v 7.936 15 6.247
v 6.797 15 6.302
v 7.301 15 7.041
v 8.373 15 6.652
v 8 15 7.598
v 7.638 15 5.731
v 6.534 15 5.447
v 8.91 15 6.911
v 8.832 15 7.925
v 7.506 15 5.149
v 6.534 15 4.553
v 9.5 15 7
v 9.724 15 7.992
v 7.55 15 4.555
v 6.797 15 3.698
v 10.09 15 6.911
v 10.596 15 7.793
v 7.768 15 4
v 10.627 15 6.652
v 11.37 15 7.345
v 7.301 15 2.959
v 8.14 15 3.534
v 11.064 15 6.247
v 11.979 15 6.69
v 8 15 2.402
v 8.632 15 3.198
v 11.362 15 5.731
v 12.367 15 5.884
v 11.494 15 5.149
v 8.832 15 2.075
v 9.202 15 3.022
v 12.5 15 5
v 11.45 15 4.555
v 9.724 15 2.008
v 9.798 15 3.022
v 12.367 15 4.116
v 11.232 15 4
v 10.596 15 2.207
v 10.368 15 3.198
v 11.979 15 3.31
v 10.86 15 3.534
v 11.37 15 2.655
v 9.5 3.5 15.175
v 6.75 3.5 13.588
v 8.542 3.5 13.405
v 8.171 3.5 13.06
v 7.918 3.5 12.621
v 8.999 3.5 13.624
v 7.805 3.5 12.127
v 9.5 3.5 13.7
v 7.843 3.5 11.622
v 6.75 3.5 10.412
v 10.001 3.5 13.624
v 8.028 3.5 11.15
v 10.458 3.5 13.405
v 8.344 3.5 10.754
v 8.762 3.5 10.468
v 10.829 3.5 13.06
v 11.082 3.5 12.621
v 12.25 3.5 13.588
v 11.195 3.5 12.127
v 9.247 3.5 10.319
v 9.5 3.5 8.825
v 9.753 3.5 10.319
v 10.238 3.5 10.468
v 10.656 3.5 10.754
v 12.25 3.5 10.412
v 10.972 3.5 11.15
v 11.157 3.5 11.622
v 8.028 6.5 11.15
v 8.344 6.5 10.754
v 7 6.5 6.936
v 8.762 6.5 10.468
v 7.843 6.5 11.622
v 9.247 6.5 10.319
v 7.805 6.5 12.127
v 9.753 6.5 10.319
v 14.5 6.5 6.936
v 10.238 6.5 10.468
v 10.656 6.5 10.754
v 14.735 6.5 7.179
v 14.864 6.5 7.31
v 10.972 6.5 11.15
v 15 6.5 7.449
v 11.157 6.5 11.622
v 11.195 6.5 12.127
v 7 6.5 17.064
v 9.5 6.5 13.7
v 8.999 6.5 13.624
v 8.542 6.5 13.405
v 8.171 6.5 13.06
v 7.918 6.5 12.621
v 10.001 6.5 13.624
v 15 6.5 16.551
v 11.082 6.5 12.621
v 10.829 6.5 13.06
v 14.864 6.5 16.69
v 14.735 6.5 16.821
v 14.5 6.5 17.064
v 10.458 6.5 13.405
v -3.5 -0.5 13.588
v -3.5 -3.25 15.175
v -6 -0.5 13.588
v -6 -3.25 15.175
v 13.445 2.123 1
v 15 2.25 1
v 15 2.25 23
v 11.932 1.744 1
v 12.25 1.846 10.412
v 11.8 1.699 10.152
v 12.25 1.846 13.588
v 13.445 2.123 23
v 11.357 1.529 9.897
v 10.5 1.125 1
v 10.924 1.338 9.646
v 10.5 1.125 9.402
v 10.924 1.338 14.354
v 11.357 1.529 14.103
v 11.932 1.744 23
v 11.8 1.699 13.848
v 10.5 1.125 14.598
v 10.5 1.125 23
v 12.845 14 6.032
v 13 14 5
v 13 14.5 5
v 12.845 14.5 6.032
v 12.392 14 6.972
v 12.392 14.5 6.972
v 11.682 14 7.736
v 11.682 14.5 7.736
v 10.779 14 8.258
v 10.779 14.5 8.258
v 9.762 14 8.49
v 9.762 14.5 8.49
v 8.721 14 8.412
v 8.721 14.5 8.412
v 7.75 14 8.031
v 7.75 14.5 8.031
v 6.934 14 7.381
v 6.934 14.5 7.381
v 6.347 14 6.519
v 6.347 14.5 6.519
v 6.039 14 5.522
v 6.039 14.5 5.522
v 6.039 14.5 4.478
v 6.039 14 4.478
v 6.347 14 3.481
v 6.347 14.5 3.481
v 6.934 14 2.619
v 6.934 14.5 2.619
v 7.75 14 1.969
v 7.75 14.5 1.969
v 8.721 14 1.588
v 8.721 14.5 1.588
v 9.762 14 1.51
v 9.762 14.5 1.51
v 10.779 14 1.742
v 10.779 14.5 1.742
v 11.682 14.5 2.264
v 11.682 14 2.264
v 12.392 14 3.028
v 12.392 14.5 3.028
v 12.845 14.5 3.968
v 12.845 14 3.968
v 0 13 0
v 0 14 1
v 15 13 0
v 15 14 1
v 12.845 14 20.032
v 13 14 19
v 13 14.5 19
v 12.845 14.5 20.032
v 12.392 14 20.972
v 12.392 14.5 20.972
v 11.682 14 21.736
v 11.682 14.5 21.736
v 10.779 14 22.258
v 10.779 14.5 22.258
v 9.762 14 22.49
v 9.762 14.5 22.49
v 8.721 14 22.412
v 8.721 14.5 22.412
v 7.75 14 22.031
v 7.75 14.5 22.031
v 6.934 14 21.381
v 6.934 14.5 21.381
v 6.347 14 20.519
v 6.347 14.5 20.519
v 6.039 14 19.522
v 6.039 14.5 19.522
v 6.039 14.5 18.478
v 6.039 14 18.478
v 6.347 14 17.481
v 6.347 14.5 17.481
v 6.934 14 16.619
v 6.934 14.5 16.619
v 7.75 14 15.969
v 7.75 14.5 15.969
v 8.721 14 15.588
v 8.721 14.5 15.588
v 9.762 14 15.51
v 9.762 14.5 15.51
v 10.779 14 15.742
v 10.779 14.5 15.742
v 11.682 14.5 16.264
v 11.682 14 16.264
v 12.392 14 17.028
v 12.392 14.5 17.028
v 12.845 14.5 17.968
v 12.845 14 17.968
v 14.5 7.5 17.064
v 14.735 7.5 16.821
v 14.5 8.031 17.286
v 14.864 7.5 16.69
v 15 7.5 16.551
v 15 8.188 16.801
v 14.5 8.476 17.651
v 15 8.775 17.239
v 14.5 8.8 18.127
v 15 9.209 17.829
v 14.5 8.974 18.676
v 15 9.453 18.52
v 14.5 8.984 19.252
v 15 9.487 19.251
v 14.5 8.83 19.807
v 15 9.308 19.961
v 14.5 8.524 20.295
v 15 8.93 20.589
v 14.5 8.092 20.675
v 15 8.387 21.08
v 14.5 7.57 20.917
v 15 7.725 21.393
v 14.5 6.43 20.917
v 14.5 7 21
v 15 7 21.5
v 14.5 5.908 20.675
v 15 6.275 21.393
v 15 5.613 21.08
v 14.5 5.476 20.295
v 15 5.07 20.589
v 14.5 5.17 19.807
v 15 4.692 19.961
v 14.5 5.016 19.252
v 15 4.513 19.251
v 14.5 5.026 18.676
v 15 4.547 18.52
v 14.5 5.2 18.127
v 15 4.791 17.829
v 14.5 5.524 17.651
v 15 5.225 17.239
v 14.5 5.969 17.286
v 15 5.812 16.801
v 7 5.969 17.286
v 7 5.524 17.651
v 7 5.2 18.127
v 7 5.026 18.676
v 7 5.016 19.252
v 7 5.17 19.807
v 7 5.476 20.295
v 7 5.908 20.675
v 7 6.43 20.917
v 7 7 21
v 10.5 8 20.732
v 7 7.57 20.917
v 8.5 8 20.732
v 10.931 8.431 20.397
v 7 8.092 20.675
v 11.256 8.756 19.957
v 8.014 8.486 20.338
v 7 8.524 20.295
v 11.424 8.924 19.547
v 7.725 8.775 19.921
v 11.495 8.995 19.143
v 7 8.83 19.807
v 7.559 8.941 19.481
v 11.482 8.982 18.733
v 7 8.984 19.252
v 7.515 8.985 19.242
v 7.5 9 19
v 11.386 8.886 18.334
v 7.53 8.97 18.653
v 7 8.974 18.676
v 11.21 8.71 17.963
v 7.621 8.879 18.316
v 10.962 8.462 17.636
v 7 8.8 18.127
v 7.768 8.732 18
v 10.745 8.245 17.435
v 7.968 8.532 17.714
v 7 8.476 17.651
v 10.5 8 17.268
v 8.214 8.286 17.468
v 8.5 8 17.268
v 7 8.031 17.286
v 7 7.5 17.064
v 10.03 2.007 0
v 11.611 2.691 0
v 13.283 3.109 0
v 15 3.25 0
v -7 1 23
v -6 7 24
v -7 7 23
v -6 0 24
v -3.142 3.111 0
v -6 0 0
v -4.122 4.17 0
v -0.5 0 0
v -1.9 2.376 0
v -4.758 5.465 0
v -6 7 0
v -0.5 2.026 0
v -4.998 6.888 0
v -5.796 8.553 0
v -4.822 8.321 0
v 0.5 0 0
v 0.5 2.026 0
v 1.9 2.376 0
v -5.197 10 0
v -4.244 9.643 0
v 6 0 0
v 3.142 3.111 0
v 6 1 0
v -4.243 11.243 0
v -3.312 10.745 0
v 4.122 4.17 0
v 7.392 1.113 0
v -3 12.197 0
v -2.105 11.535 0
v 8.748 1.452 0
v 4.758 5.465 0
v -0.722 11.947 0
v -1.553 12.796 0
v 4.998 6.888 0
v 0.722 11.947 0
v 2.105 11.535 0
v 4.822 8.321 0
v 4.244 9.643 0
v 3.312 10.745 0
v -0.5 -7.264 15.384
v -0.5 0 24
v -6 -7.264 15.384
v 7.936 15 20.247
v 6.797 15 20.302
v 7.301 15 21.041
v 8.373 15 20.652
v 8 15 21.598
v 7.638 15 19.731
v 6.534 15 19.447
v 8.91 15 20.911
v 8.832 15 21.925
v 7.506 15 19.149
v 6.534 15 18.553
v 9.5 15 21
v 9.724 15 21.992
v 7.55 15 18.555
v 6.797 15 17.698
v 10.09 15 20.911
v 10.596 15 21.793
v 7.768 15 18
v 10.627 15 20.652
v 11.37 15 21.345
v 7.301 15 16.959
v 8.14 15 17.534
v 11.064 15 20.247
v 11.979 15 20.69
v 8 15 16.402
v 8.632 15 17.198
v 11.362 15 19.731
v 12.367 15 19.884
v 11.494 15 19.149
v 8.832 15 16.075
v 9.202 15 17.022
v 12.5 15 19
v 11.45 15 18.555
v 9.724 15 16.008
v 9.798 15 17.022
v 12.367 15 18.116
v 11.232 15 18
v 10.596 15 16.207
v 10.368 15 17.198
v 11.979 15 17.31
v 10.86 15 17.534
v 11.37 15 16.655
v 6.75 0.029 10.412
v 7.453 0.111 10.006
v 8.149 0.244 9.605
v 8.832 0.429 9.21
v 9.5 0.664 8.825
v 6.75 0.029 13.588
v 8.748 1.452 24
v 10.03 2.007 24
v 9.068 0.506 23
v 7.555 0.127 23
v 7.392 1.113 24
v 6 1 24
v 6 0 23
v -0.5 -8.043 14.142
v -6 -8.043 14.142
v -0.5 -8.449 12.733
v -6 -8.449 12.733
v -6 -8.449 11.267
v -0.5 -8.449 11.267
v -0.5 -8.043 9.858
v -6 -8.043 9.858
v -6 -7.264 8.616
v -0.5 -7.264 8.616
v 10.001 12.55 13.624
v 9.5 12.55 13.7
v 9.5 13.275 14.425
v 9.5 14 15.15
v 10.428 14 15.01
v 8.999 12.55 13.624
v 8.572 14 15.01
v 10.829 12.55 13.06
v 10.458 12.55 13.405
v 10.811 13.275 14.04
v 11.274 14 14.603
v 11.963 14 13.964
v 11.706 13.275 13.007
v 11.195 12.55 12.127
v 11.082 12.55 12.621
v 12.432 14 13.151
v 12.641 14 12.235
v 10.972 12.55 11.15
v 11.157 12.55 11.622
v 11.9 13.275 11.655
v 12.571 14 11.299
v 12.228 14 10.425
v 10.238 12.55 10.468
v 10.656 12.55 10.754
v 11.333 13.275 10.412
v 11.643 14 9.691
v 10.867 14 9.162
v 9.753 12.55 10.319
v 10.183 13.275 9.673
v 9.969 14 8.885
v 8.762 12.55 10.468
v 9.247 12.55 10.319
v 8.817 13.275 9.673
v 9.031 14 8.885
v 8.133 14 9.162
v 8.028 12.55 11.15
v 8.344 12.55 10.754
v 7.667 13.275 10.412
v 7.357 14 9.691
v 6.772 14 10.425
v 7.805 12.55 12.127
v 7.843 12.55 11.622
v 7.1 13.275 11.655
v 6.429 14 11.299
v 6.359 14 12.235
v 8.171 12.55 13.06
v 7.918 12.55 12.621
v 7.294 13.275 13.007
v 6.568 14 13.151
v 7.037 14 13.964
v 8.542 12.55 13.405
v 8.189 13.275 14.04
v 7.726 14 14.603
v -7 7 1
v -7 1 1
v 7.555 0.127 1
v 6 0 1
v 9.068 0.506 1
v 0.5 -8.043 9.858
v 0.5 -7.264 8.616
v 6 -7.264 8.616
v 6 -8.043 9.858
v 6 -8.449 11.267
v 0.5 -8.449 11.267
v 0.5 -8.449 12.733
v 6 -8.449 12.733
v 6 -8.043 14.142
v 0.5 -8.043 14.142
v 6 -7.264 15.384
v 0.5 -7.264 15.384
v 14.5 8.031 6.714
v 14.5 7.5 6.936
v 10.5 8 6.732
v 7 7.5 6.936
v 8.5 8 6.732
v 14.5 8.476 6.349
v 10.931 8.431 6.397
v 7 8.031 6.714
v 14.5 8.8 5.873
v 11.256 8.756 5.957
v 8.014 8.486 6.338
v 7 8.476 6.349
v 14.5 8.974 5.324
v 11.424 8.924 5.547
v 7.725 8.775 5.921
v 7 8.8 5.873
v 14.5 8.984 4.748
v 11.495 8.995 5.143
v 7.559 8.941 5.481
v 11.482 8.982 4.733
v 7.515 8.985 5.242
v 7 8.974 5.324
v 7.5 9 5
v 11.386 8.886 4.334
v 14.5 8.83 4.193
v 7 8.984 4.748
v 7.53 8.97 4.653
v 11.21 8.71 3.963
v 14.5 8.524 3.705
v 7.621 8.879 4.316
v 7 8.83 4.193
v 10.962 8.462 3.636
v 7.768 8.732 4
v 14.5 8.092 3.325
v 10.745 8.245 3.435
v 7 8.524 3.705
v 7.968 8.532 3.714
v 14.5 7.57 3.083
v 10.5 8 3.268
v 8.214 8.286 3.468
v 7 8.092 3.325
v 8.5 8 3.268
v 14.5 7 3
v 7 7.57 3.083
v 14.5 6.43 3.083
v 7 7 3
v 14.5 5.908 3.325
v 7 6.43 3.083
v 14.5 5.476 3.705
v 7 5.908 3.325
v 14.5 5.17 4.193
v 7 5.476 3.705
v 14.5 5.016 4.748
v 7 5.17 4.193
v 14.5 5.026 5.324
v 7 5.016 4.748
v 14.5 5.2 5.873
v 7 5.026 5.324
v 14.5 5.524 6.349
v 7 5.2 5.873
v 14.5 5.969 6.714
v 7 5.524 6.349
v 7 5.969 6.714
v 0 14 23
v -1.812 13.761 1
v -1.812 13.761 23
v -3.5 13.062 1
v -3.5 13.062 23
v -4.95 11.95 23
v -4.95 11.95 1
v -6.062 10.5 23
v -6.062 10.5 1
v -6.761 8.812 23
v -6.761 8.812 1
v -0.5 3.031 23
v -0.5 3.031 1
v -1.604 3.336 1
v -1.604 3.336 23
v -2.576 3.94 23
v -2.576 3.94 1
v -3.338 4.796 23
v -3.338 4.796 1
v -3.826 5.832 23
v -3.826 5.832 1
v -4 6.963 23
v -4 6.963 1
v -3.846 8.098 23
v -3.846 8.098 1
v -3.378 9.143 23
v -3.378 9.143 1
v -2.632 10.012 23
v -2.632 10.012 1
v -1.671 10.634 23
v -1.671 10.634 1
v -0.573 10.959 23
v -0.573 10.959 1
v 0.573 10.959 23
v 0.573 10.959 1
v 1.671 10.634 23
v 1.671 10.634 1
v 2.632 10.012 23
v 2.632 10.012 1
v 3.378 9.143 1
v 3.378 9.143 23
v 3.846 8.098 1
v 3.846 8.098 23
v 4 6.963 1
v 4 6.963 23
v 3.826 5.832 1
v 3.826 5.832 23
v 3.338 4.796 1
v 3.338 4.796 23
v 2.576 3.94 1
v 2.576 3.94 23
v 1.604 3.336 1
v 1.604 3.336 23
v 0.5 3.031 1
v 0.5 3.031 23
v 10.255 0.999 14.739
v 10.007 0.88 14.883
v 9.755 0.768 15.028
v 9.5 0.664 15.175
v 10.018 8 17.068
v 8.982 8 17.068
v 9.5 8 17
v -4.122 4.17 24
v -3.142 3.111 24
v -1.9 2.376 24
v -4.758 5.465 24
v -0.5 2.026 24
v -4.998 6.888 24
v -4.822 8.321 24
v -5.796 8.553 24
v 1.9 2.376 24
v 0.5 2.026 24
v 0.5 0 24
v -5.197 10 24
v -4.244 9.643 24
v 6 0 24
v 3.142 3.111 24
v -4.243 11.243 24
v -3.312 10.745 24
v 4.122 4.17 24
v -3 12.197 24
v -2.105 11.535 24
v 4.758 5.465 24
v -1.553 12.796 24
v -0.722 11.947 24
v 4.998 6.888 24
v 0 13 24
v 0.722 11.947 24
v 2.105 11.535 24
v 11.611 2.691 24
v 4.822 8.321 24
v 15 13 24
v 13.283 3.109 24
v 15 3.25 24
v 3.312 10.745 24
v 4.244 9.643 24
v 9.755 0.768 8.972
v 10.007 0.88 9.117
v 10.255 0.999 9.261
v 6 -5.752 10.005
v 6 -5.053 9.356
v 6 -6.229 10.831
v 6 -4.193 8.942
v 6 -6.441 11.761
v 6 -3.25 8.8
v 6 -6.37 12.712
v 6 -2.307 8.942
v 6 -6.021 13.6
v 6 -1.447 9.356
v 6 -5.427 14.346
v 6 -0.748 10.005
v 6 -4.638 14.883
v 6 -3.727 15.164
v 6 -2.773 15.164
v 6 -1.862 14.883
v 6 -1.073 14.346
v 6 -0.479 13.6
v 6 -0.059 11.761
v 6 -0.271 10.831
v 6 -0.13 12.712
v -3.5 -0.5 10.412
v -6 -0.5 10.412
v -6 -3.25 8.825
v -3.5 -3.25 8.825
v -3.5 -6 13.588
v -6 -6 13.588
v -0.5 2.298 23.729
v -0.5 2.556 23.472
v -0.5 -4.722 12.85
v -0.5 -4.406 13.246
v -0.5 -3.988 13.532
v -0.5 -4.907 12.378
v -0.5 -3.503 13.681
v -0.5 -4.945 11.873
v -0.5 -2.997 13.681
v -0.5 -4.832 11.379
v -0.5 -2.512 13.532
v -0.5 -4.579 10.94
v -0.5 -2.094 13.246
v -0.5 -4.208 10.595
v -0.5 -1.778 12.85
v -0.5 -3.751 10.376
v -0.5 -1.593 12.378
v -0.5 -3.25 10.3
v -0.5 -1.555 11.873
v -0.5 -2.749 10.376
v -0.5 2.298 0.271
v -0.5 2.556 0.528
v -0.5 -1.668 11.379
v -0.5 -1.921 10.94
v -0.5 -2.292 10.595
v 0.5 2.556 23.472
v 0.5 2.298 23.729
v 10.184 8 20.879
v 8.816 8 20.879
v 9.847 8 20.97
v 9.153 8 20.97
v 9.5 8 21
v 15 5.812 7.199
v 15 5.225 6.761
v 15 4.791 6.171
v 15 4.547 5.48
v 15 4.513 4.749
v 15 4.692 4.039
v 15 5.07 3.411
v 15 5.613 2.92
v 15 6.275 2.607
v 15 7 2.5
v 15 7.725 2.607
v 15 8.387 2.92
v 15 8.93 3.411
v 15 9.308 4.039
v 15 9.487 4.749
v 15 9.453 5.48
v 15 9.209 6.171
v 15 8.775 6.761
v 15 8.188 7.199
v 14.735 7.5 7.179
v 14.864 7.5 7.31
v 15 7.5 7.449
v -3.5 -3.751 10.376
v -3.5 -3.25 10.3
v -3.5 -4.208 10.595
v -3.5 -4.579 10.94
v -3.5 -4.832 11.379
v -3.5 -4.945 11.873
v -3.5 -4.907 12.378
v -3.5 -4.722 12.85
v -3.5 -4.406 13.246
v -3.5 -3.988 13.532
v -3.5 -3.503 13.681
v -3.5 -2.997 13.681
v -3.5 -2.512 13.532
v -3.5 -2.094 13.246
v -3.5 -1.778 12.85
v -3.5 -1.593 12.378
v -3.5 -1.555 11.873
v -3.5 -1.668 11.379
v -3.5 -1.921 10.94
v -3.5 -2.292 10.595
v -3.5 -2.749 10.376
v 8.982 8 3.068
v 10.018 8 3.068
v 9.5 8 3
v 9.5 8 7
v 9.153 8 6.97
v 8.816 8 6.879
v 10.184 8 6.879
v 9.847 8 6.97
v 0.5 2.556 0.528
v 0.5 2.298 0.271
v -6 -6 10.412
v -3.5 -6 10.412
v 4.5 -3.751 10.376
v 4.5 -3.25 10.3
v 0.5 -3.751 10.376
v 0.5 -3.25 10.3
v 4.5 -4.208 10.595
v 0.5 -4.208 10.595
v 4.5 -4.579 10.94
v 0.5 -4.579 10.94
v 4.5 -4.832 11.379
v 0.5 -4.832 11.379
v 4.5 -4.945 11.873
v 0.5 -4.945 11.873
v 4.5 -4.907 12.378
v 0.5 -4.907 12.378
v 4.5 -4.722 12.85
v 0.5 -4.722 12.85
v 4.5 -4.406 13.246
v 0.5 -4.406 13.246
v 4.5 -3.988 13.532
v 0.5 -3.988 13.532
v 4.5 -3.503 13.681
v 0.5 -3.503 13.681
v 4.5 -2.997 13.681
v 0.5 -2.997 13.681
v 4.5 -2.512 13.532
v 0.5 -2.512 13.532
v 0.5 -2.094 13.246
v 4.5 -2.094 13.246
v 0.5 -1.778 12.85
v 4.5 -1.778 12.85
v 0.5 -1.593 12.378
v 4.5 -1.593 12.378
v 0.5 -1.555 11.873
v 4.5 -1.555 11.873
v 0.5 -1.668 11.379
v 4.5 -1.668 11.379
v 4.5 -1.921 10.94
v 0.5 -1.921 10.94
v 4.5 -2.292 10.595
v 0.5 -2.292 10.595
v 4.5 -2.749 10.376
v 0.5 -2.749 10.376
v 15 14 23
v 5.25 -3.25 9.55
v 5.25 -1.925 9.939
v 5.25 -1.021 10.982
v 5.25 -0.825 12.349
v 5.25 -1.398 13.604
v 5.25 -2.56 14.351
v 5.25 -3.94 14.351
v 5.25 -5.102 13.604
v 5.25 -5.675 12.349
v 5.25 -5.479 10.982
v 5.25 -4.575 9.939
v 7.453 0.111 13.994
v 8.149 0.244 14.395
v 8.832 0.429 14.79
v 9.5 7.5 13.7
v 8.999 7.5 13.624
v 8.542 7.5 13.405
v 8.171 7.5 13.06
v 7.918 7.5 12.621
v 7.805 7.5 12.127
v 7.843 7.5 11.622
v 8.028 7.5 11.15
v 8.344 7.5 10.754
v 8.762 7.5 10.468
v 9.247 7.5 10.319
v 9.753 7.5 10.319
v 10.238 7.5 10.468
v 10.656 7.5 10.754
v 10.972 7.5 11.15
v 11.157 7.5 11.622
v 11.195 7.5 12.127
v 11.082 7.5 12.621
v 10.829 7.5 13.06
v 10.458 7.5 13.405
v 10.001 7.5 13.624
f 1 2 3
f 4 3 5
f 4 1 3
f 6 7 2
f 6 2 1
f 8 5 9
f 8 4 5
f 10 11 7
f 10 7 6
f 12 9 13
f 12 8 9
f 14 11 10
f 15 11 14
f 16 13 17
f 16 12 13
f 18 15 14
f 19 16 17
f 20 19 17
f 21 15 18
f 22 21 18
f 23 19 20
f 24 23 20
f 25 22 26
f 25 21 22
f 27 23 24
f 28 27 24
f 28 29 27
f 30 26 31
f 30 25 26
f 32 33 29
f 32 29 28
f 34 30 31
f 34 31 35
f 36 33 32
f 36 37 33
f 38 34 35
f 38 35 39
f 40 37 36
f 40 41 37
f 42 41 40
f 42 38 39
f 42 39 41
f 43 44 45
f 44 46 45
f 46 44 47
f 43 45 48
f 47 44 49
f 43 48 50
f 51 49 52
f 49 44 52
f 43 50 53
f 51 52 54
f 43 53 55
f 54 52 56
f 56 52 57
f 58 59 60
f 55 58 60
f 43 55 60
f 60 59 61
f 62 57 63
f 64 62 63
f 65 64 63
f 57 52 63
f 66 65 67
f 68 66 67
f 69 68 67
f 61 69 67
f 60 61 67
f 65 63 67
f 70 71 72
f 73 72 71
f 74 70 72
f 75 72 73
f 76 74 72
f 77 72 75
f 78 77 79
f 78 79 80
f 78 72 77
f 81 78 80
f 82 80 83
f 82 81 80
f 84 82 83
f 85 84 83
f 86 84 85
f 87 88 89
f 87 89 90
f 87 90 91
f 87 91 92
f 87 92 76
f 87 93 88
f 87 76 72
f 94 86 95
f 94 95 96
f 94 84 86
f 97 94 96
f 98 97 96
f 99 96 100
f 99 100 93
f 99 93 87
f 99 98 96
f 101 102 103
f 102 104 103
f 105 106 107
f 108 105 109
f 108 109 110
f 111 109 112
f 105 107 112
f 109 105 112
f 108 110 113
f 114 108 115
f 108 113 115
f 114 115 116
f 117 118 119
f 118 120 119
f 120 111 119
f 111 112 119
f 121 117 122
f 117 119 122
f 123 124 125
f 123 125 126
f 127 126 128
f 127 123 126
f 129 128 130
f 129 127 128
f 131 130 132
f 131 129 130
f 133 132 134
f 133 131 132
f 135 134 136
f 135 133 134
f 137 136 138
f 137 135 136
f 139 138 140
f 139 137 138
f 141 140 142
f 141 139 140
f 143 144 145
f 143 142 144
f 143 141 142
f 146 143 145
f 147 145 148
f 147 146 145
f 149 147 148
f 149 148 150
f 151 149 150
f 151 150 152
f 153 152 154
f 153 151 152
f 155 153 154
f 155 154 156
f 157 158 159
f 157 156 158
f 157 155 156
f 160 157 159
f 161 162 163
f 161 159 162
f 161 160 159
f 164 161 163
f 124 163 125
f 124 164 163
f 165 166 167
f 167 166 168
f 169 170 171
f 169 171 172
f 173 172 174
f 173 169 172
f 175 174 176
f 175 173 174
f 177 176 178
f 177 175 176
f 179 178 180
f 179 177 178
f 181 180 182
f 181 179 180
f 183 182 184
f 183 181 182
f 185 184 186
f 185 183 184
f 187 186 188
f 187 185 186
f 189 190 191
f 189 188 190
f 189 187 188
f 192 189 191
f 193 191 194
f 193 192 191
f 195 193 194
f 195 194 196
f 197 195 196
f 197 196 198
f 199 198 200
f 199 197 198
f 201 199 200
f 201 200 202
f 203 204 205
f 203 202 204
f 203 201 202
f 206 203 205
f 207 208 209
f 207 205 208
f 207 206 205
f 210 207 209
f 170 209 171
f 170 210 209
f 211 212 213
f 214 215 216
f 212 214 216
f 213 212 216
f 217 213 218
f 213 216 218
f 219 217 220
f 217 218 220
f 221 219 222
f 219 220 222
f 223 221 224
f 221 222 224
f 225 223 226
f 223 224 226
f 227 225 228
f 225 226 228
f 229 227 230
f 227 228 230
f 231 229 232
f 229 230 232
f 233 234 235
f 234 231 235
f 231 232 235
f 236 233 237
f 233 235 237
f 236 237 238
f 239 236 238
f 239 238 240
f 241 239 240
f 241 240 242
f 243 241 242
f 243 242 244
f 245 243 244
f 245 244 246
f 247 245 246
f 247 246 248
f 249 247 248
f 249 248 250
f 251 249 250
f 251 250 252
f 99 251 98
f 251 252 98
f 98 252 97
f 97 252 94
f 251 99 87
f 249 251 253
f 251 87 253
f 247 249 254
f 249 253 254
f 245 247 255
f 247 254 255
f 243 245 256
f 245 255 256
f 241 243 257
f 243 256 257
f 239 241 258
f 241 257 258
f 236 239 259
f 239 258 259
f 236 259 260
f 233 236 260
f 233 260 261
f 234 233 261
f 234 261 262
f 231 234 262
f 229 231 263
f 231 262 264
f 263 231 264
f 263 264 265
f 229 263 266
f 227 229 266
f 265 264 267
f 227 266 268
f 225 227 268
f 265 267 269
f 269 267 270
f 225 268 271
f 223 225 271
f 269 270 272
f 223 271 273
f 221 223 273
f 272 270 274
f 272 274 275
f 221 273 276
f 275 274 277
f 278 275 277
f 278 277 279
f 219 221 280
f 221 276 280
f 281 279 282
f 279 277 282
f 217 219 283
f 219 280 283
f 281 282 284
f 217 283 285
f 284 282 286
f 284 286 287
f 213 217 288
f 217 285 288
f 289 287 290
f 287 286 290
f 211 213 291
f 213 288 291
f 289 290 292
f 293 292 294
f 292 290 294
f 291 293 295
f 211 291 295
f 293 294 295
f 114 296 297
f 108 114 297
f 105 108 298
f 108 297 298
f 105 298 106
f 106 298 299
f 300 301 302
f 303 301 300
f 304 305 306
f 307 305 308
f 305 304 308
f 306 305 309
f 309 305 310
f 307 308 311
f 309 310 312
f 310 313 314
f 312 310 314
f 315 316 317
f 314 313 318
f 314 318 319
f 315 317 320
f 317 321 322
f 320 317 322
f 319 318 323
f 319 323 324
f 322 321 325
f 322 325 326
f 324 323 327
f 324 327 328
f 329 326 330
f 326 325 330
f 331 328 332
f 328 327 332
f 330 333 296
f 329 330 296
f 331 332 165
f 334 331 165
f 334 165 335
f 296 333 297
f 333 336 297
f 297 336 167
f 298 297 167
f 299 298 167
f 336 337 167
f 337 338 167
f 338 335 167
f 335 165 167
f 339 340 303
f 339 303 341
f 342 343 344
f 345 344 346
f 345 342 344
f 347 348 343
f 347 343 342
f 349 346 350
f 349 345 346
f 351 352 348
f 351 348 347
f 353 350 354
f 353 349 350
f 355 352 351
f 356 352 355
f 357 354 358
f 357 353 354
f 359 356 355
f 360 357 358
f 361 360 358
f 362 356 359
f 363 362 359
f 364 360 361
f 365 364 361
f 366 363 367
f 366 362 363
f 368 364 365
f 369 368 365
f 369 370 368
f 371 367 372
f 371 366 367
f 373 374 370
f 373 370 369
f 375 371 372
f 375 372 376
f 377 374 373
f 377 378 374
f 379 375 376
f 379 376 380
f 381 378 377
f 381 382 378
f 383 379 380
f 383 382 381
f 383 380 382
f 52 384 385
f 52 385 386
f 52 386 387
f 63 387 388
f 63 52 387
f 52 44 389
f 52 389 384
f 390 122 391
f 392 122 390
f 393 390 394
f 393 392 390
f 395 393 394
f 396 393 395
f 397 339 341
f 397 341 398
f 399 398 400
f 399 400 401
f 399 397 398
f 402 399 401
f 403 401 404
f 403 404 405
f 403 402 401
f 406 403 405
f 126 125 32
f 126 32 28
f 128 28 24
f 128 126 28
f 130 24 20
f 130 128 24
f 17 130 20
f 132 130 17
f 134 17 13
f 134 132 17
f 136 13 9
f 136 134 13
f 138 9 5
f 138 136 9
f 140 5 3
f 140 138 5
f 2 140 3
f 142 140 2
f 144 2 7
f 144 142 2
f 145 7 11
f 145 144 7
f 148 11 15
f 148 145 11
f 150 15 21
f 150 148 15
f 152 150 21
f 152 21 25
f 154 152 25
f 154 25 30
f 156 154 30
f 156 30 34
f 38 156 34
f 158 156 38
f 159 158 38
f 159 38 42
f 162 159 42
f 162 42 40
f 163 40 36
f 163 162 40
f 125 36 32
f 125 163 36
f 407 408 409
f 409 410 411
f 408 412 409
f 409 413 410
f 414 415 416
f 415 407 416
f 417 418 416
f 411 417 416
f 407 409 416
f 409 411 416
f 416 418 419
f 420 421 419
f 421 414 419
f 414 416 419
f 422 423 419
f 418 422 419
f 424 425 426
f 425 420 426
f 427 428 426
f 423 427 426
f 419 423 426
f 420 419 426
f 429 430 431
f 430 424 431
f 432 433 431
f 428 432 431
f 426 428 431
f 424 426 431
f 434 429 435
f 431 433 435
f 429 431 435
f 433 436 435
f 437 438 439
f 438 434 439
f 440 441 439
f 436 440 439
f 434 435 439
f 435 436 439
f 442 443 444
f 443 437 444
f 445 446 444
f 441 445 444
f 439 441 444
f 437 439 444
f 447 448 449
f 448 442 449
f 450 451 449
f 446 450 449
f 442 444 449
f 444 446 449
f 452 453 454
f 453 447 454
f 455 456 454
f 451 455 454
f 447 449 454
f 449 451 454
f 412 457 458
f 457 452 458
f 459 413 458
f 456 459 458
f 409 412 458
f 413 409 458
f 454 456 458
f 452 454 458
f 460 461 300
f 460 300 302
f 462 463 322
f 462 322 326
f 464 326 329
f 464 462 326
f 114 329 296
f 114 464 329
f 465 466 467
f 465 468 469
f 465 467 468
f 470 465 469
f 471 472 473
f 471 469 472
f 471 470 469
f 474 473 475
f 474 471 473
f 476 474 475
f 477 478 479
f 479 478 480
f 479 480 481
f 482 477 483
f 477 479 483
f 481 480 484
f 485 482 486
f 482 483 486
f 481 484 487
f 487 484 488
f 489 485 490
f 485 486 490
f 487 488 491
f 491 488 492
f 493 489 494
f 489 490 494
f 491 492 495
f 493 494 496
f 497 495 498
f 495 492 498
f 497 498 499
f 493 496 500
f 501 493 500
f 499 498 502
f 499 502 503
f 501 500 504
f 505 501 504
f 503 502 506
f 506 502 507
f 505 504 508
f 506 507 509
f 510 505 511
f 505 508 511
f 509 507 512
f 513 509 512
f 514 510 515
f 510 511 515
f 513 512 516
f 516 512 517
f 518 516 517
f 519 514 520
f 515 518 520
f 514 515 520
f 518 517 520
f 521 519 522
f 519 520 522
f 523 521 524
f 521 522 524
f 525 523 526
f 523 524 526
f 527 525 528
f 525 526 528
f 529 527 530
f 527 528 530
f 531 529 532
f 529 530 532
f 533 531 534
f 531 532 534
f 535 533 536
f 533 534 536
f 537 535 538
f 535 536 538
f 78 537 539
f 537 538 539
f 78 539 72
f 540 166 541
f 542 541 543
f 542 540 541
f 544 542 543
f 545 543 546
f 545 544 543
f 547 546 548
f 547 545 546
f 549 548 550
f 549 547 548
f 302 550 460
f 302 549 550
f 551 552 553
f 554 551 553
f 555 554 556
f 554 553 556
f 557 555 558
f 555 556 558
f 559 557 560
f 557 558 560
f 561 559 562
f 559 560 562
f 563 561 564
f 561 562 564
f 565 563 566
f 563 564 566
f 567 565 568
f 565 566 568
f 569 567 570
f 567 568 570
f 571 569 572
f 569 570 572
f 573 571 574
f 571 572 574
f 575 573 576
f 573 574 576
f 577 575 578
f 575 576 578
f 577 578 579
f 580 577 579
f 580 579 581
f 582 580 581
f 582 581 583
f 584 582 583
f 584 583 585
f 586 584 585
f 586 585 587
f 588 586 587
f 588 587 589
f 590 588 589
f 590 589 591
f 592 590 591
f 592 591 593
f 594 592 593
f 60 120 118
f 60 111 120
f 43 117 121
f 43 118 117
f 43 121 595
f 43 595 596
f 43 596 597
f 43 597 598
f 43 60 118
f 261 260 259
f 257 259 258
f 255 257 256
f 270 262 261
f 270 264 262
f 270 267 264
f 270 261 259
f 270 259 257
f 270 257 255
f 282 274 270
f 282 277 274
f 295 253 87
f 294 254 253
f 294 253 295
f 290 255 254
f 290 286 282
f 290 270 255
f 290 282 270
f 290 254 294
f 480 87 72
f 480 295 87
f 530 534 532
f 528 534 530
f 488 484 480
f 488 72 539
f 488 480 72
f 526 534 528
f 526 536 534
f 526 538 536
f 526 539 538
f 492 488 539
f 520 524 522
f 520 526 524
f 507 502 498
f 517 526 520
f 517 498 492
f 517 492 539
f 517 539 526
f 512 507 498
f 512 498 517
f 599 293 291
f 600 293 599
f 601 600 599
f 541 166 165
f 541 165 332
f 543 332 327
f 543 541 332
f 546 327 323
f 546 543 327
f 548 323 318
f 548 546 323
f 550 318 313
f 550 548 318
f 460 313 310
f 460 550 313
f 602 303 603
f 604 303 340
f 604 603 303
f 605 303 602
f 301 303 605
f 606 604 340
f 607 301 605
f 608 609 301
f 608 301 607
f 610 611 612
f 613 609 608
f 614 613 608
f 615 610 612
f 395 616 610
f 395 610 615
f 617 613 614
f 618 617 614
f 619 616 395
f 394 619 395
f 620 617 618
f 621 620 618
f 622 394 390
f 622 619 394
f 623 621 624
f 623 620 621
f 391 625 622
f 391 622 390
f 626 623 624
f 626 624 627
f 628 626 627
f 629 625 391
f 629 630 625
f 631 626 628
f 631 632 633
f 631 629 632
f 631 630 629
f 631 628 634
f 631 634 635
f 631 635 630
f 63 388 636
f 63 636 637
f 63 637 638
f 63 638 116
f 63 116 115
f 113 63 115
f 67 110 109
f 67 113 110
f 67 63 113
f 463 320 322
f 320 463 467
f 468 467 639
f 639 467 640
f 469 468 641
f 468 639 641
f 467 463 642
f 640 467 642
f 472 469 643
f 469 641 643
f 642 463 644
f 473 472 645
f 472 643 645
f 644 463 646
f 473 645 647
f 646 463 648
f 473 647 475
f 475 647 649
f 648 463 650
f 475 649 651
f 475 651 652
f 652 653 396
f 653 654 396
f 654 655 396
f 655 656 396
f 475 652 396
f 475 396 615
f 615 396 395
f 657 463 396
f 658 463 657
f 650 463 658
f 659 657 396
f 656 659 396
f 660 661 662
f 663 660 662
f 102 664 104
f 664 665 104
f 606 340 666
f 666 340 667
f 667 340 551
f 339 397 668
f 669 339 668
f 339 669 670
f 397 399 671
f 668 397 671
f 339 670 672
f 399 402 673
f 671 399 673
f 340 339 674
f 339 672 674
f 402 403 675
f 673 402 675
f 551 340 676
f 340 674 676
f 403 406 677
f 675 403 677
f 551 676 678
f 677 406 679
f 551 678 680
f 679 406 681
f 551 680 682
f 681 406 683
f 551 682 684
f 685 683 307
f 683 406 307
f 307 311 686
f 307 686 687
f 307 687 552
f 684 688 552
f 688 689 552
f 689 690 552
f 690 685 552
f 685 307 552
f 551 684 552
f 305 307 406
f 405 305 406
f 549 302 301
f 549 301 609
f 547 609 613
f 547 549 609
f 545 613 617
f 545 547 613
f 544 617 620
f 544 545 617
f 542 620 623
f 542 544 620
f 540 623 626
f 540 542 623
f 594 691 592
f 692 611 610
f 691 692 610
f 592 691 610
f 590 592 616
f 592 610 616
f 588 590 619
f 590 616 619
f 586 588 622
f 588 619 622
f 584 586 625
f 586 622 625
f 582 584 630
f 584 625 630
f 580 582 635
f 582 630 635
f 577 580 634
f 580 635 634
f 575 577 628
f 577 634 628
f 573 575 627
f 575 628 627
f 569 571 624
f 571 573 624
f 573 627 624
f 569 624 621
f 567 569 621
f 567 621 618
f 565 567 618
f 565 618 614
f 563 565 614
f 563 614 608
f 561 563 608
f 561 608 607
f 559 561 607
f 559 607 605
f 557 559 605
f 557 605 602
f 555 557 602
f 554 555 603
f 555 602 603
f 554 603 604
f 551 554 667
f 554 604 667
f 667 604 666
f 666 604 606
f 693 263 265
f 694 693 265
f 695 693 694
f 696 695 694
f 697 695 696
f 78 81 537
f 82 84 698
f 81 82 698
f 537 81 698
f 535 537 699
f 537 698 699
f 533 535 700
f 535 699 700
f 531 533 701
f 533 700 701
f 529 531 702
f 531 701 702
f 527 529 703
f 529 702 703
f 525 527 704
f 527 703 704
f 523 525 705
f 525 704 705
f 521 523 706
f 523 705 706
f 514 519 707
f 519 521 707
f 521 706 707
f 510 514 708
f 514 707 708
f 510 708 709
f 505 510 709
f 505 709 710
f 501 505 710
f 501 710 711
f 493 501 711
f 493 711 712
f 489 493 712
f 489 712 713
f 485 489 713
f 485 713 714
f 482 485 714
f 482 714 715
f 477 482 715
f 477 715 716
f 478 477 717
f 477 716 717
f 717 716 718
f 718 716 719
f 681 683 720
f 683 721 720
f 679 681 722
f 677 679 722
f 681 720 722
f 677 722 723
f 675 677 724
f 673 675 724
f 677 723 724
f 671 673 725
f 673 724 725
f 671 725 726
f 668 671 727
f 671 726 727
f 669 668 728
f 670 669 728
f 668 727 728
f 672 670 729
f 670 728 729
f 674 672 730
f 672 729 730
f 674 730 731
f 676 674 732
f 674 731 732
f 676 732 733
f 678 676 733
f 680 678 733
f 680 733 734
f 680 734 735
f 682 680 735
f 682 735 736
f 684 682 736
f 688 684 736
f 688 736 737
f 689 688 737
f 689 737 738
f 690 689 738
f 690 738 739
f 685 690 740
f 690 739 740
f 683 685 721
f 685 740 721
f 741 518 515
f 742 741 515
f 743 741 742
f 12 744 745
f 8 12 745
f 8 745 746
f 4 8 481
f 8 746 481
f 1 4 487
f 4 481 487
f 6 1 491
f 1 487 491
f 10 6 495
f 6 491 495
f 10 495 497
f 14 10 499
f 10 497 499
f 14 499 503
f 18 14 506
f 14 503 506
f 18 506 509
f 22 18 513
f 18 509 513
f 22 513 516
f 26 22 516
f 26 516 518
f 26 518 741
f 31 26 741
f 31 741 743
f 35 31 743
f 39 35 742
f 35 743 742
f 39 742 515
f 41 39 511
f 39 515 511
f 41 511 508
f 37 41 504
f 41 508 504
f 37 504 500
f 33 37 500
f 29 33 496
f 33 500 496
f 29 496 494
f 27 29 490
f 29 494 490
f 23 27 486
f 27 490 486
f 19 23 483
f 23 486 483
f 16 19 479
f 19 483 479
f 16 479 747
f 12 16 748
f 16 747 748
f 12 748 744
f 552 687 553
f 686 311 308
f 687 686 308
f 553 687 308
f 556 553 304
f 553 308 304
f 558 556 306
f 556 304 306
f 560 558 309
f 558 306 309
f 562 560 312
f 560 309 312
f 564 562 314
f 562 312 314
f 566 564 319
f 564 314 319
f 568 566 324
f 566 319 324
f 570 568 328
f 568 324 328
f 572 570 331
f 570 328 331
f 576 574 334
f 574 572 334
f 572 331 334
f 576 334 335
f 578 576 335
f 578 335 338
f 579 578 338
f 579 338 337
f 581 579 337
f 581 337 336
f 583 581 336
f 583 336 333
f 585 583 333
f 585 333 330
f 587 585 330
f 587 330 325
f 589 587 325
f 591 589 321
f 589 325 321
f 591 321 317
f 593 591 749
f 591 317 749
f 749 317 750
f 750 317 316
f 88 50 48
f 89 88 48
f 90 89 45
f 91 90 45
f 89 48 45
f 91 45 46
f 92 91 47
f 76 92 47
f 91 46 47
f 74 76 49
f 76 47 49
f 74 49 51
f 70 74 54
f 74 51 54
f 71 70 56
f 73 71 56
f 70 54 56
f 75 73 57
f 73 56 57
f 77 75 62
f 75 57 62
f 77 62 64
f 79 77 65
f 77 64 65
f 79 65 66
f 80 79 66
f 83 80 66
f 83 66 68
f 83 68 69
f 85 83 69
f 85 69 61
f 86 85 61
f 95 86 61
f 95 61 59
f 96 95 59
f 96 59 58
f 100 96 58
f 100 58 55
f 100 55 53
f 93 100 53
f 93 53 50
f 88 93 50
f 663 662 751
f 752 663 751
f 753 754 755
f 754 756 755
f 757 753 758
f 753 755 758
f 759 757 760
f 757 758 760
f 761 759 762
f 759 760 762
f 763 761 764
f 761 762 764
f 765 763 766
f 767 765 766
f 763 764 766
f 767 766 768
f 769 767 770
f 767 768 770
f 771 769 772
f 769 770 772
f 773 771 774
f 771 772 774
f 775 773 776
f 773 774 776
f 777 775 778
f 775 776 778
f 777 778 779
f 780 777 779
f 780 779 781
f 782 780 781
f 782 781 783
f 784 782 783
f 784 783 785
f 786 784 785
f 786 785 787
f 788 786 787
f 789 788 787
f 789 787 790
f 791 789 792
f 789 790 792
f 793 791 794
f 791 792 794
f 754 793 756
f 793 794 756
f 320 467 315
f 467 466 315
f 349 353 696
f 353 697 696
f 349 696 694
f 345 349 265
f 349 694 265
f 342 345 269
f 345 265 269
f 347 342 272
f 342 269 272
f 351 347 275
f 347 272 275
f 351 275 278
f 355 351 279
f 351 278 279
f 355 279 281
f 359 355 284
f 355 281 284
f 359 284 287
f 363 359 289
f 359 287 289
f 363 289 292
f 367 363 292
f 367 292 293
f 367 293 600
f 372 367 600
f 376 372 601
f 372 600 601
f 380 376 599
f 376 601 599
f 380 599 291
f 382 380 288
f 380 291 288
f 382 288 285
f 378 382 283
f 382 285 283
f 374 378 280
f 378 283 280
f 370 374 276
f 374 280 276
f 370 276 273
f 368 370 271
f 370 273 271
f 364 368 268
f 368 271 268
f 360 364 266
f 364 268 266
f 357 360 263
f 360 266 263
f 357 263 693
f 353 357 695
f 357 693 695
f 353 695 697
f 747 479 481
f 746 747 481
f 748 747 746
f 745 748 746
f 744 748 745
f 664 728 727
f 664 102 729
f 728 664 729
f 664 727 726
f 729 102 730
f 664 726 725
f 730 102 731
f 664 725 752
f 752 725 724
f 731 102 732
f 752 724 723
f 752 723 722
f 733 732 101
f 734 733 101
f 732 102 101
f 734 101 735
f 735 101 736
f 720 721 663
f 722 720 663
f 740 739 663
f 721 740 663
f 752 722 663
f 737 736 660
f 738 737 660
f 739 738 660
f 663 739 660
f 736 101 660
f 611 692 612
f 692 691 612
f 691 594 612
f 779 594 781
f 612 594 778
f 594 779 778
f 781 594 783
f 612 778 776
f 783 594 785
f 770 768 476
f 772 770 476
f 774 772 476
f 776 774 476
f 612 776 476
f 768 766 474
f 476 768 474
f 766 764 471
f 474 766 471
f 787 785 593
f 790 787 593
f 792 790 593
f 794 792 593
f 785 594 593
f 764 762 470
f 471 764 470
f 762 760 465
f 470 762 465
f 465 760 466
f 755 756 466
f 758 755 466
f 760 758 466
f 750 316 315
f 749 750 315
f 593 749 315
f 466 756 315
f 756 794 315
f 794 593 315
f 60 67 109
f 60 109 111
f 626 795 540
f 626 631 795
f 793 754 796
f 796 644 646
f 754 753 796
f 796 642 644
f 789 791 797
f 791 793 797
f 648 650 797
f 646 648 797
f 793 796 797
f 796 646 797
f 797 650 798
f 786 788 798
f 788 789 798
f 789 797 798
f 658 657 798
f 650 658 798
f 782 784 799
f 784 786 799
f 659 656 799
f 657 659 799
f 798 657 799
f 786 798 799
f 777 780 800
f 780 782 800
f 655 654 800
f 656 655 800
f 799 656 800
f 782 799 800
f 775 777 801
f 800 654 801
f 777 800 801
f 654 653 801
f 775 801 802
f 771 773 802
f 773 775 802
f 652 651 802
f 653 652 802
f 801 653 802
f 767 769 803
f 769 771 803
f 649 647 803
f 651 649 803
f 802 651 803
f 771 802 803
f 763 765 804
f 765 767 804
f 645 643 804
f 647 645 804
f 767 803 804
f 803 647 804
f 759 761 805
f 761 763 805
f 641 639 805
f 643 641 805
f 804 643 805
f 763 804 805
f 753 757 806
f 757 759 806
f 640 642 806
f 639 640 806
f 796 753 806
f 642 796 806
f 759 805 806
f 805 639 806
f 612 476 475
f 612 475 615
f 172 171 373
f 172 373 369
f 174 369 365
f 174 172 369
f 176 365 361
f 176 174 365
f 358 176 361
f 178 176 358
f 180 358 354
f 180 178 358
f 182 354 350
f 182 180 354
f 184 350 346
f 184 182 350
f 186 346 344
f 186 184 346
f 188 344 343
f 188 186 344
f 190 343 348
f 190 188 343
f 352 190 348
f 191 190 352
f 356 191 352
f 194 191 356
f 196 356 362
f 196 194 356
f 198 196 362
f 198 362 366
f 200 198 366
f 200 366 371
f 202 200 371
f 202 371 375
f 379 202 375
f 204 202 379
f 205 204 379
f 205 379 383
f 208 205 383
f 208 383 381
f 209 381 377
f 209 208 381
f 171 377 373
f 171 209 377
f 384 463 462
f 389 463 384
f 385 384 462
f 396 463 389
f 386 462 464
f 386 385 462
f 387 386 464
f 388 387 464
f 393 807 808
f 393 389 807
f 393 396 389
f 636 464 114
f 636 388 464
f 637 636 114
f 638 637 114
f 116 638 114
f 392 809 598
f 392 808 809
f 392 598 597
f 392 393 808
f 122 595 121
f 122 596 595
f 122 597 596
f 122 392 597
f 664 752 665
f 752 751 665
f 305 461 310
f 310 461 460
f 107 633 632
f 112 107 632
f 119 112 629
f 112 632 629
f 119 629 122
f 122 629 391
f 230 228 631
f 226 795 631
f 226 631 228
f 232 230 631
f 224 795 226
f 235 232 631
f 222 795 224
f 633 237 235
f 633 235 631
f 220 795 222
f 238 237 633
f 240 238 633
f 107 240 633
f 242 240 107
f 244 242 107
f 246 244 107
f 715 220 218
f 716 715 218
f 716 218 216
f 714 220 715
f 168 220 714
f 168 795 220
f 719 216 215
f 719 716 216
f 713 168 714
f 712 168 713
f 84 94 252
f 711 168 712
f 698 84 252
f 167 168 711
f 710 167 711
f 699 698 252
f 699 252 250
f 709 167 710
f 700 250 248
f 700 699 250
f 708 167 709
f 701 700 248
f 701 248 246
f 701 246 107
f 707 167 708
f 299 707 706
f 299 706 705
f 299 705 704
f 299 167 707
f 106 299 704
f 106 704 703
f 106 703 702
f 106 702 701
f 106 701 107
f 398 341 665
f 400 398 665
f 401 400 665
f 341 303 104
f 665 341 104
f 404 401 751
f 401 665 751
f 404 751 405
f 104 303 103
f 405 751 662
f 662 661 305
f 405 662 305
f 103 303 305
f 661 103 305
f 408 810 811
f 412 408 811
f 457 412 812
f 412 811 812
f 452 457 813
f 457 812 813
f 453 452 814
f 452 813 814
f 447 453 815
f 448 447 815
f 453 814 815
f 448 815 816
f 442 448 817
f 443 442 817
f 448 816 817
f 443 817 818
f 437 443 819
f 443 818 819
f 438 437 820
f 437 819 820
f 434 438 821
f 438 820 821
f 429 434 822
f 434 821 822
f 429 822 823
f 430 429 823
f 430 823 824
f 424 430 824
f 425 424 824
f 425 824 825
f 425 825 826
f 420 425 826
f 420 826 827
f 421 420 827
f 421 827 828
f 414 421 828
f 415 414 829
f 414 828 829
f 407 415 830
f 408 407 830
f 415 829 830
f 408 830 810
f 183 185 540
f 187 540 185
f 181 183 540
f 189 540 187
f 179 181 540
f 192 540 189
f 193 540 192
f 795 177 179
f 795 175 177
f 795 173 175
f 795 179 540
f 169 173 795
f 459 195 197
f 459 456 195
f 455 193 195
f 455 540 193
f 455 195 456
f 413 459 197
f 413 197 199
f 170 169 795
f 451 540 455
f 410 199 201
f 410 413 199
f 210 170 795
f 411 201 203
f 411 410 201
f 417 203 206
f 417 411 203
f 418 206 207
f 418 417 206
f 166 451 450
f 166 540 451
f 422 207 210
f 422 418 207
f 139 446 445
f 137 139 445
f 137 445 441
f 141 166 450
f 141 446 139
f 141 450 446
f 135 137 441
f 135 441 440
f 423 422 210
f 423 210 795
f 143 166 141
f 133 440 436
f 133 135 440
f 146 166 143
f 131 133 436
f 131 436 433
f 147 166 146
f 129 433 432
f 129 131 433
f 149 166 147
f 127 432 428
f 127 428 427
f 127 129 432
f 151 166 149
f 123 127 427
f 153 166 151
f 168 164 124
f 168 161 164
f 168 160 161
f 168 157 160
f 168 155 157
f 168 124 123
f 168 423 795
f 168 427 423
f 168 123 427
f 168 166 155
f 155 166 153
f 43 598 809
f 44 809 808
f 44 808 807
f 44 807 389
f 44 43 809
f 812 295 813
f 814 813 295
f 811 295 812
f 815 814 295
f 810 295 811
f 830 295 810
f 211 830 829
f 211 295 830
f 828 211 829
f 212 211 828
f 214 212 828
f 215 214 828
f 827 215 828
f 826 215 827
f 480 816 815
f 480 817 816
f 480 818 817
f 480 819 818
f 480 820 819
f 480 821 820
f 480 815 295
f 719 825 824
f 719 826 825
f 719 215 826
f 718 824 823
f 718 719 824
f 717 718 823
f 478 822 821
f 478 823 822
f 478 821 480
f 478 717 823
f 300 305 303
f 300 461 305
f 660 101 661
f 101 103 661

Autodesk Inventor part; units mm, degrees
ref_plane "YZ Plane" through (0, 0, 0) normal (1, 0, 0) x (0, 1, 0)
sketch "Sketch1" plane through (0, 0, 0) normal (0, 0, 1) x (1, 0, 0)
  line L0 (0, 14) -> (0, 11)
  line L1 (0, 14) -> (15, 14)
  line L2 (15, 14) -> (15, 0)
  circle A0 centre (0, 7) radius 4
  line L3 (0, 3) -> (0, 0) construction
  line L4 (0, 0) -> (15, 0)
  line L5 (0, 11) -> (0, 3) construction
  line L6 (0.5, 0) -> (-0.5, 0)
  line L7 (-0.5, 0) -> (-0.5, 3.0314)
  line L8 (-0.5, 3.0314) -> (0.5, 3.0314)
  line L9 (0.5, 3.0314) -> (0.5, 0)
  line L10 (-0.5, 0) -> (-7, 0)
  line L11 (-7, 0) -> (-7, 14)
  line L12 (-7, 14) -> (0, 14)
  line L13 (-4, 10.1012) -> (-4, 3.4286) construction
  point P0 (0, 3.0314)
  dimension "d0" = 8
  dimension "d1" = 15
  dimension "d2" = 14
  dimension "d79" = 1
  dimension "d80" = 3
  dimension "d81" = 3
extrude "Extrusion1" add sketch "Sketch1" along normal blind 24 contours L1 L2 L4 L9 A0 L0 | L0 A0 L7 L10 L11 L12
sketch "Sketch2" plane through (15, 0, 0) normal (1, 0, 0) x (0, 0, -1)
  line L0 (-24, 0) -> (-24, 14) projected
  line L1 (0, 0) -> (0, 14) projected
  point P0 (-19, 7)
  point P1 (-5, 7)
  point P2 (-24, 7)
  dimension "d5" = 5
  dimension "d6" = 5
  dimension "d7" = 14
hole "Hole1" at (15, 7, 19) at (15, 7, 5) direction (-1, 0, 0) diameter 4 depth 8
sketch "Sketch4" plane through (0, 14, 0) normal (0, 1, 0) x (1, 0, 0)
  circle A0 centre (9.5, -5) radius 3.5
  circle A1 centre (9.5, -19) radius 3.5
  line L0 (15, -24) -> (-7, -24) projected
  line L1 (15, 0) -> (0, 0) projected
  line L2 (-0.5, 0) -> (0.5, 0) projected
  line L3 (-0.5, -24) -> (0.5, -24) projected
  line L4 (4, -24) -> (4, 0) projected
  line L5 (4, -24) -> (4, 0)
  line L6 (4, -24) -> (4, 0) projected
  line L7 (15, 0) -> (15, -24) projected
  line L8 (0.5, 0) -> (0.5, -24) projected
  line L9 (-0.5, 0) -> (-0.5, -24) projected
  point P0 (4, -24)
  point P1 (0, -24)
  dimension "d18" = 7
  dimension "d19" = 7
  dimension "d20" = 14
  dimension "d21" = 5
  dimension "d22" = 5
  dimension "d42" = 5.5
  dimension "d43" = 5.5
extrude "Extrusion2" add sketch "Sketch4" along normal blind 1 contours A0 | A1
sketch "Sketch3" plane through (2, 15, 0) normal (0, 1, 0) x (1, 0, 0)
  circle A0 centre (7.5, -5) radius 3.5 projected
  circle A1 centre (7.5, -19) radius 3.5 projected
hole "Hole2" at (9.5, 15, 19) at (9.5, 15, 5) direction (0, -1, 0) diameter 4 depth 7
sketch "Sketch5" plane through (15, 0, 0) normal (1, 0, 0) x (0, 0, -1)
  line L0 (-17.0635, 7.5) -> (-6.9365, 7.5)
  line L1 (-6.9365, 7.5) -> (-6.9365, 6.5)
  line L2 (-6.9365, 6.5) -> (-17.0635, 6.5)
  line L3 (-17.0635, 6.5) -> (-17.0635, 7.5)
  circle A0 centre (-5, 7) radius 2 projected
  circle A1 centre (-19, 7) radius 2 projected
  point P0 (0, 0)
  point P1 (-6.9365, 7)
  point P2 (-17.0635, 6.5)
  dimension "d35" = 1
extrude "Extrusion3" cut sketch "Sketch5" against normal blind 8 contours L0 A0 L2 A1
sketch "Sketch7" plane through (0, 14, 0) normal (0, 1, 0) x (1, 0, 0)
  circle A0 centre (9.5, -5) radius 2 projected
  circle A1 centre (9.5, -19) radius 2 projected
  point P0 (0, 0)
  point P1 (9.5, -12)
  dimension "d44" = 7
  dimension "d45" = 7
hole "Hole3" at (9.5, 14, 12) direction (0, -1, 0) diameter 3.4 end through all countersink diameter 6.3 countersink angle 90 clearance for "Flat Head Machine Screw" size "M3" standard "Ansi Metric M Profile"
chamfer "Chamfer3" distance 0.5 angle 45 2 edges at (15, 7, 21) (15, 7, 3)
ref_plane "Work Plane1" through (7, 3.5, 17.0635) normal (0, 1, 0) x (1, 0, 0)
sketch "Sketch10" plane through (7, 3.5, 17.0635) normal (0, 1, 0) x (1, 0, 0)
  circle A0 centre (2.5, 5.0635) radius 1.7 projected
  line L0 (-0.25, 3.4758) -> (-0.25, 6.6512)
  line L1 (-0.25, 6.6512) -> (2.5, 8.2389)
  line L2 (2.5, 8.2389) -> (5.25, 6.6512)
  line L3 (5.25, 6.6512) -> (5.25, 3.4758)
  line L4 (5.25, 3.4758) -> (2.5, 1.8881)
  line L5 (2.5, 1.8881) -> (-0.25, 3.4758)
  point P0 (-7, 17.0635)
  dimension "d75" = 5.5
extrude "Extrusion6" cut sketch "Sketch10" against normal blind 10
sketch "Sketch12" plane through (-0.5, 0, 0) normal (1, 0, 0) x (0, 0, -1)
  circle A0 centre (-12, -3.25) radius 1.7
  circle A1 centre (-12, -3.25) radius 5.25
  line L0 (0, 0) -> (-8.616, -7.2639)
  line L1 (-24, 0) -> (-15.384, -7.2639)
  circle A2 centre (-12, -3.25) radius 3.25
  line L2 (0, 0) -> (-24, 0) projected
  point P0 (-12, 0)
  dimension "d82" = 3.4
  dimension "d84" = 2
  dimension "d95" = 6.5
extrude "Extrusion7" add sketch "Sketch12" against normal blind 5.5 contours A0 | A2 | A1 L2 | L1 L2 A1 | A1 L2 L0 picked at (-14.5812, -7.0055)
ref_plane "Work Plane3" through (0, 3.0314, 24) normal (1, 0, 0) x (0, 0, -1)
mirror "Mirror1" about plane through (0, 3.0314, 24) normal (1, 0, 0) of "Extrusion7"
fillet "Fillet1" radius 7 1 edges at (-7, 14, 12)
sketch "Sketch14" plane through (-6, 3.5, 13.5877) normal (1, 0, 0) x (0, 0, -1)
  arc A0 (-1.7963, -10.7639) -> (4.9717, -10.7639) centre (1.5877, -6.75) ccw projected
  line L0 (0, -9.5) -> (-1.5877, -6.75)
  line L1 (-1.5877, -6.75) -> (0, -4)
  line L2 (0, -4) -> (3.1754, -4)
  line L3 (3.1754, -4) -> (4.7631, -6.75)
  line L4 (4.7631, -6.75) -> (3.1754, -9.5)
  line L5 (3.1754, -9.5) -> (0, -9.5)
  point P0 (13.5877, -3.5)
  dimension "d96" = 5.5
extrude "Extrusion8" cut sketch "Sketch14" along normal blind 2.5
sketch "Sketch13" plane through (6, 0, 0) normal (-1, 0, 0) x (0, 0, 1)
  arc A0 (8.616, -7.2639) -> (15.384, -7.2639) centre (12, -3.25) ccw projected
  point P0 (0, 0)
hole "Hole4" at (6, -3.25, 12) direction (-1, 0, 0) diameter 3.4 end through all clearance for "Flat Head Machine Screw" size "M3" standard "Ansi Metric M Profile"
sketch "Sketch15" plane through (0, 0, 24) normal (0, 0, 1) x (1, 0, 0)
  line L0 (6, 0) -> (15, 0) projected
  line L1 (15, 0) -> (15, 14) projected
  line L2 (14.5, 9) -> (14.5, 5) projected
  line L3 (15, 4.5) -> (15, 9.5) projected
  line L4 (6, 0) -> (15, 0) projected
  arc A0 (6, 0) -> (10.5, 1.125) centre (6, 9.5625) ccw
  line L5 (15, 0) -> (15, 14) projected
  arc A1 (15, 2.25) -> (10.5, 1.125) centre (15, -7.3125) ccw
  line L6 (15, 4.5) -> (15, 9.5) projected
  line L7 (15, 4.5) -> (15, 0)
  line L8 (15, 2.25) -> (10.6581, 2.25) construction
  point P0 (0, 0)
  point P1 (14.5, 6.5)
  point P2 (14.5, 7.5)
  point P3 (15, 7.5)
  point P4 (15, 6.5)
  point P5 (15, 2.25)
extrude "Extrusion9" cut sketch "Sketch15" against normal blind 28.75
chamfer "Chamfer5" distance 1 angle 45 13 edges at (0, 11, 24) (0, 11, 0) (-4.9497, 11.9497, 0) (-7, 3.5, 0) (7.5, 14, 0) (7.5, 14, 24) (-4.9497, 11.9497, 24) (-7, 3.5, 24) (-7, 0, 12) (8.3192, 0.2855, 0) (12.6808, 1.9645, 0) (12.6808, 1.9645, 24) (8.3192, 0.2855, 24)
chamfer "Chamfer6" distance 0.5 angle 45 2 edges at (6, 15, 19) (6, 15, 5)
chamfer "Chamfer7" distance 1.5 angle 45 1 edges at (6, -3.25, 13.7)
equation "\"d81\" = d80"
equation "\"d6\" = d5"
equation "\"d22\" = d21"
equation "\"d42\" = d43"
equation "\"d44\" = d45"
properties part number "XY Joiner"
